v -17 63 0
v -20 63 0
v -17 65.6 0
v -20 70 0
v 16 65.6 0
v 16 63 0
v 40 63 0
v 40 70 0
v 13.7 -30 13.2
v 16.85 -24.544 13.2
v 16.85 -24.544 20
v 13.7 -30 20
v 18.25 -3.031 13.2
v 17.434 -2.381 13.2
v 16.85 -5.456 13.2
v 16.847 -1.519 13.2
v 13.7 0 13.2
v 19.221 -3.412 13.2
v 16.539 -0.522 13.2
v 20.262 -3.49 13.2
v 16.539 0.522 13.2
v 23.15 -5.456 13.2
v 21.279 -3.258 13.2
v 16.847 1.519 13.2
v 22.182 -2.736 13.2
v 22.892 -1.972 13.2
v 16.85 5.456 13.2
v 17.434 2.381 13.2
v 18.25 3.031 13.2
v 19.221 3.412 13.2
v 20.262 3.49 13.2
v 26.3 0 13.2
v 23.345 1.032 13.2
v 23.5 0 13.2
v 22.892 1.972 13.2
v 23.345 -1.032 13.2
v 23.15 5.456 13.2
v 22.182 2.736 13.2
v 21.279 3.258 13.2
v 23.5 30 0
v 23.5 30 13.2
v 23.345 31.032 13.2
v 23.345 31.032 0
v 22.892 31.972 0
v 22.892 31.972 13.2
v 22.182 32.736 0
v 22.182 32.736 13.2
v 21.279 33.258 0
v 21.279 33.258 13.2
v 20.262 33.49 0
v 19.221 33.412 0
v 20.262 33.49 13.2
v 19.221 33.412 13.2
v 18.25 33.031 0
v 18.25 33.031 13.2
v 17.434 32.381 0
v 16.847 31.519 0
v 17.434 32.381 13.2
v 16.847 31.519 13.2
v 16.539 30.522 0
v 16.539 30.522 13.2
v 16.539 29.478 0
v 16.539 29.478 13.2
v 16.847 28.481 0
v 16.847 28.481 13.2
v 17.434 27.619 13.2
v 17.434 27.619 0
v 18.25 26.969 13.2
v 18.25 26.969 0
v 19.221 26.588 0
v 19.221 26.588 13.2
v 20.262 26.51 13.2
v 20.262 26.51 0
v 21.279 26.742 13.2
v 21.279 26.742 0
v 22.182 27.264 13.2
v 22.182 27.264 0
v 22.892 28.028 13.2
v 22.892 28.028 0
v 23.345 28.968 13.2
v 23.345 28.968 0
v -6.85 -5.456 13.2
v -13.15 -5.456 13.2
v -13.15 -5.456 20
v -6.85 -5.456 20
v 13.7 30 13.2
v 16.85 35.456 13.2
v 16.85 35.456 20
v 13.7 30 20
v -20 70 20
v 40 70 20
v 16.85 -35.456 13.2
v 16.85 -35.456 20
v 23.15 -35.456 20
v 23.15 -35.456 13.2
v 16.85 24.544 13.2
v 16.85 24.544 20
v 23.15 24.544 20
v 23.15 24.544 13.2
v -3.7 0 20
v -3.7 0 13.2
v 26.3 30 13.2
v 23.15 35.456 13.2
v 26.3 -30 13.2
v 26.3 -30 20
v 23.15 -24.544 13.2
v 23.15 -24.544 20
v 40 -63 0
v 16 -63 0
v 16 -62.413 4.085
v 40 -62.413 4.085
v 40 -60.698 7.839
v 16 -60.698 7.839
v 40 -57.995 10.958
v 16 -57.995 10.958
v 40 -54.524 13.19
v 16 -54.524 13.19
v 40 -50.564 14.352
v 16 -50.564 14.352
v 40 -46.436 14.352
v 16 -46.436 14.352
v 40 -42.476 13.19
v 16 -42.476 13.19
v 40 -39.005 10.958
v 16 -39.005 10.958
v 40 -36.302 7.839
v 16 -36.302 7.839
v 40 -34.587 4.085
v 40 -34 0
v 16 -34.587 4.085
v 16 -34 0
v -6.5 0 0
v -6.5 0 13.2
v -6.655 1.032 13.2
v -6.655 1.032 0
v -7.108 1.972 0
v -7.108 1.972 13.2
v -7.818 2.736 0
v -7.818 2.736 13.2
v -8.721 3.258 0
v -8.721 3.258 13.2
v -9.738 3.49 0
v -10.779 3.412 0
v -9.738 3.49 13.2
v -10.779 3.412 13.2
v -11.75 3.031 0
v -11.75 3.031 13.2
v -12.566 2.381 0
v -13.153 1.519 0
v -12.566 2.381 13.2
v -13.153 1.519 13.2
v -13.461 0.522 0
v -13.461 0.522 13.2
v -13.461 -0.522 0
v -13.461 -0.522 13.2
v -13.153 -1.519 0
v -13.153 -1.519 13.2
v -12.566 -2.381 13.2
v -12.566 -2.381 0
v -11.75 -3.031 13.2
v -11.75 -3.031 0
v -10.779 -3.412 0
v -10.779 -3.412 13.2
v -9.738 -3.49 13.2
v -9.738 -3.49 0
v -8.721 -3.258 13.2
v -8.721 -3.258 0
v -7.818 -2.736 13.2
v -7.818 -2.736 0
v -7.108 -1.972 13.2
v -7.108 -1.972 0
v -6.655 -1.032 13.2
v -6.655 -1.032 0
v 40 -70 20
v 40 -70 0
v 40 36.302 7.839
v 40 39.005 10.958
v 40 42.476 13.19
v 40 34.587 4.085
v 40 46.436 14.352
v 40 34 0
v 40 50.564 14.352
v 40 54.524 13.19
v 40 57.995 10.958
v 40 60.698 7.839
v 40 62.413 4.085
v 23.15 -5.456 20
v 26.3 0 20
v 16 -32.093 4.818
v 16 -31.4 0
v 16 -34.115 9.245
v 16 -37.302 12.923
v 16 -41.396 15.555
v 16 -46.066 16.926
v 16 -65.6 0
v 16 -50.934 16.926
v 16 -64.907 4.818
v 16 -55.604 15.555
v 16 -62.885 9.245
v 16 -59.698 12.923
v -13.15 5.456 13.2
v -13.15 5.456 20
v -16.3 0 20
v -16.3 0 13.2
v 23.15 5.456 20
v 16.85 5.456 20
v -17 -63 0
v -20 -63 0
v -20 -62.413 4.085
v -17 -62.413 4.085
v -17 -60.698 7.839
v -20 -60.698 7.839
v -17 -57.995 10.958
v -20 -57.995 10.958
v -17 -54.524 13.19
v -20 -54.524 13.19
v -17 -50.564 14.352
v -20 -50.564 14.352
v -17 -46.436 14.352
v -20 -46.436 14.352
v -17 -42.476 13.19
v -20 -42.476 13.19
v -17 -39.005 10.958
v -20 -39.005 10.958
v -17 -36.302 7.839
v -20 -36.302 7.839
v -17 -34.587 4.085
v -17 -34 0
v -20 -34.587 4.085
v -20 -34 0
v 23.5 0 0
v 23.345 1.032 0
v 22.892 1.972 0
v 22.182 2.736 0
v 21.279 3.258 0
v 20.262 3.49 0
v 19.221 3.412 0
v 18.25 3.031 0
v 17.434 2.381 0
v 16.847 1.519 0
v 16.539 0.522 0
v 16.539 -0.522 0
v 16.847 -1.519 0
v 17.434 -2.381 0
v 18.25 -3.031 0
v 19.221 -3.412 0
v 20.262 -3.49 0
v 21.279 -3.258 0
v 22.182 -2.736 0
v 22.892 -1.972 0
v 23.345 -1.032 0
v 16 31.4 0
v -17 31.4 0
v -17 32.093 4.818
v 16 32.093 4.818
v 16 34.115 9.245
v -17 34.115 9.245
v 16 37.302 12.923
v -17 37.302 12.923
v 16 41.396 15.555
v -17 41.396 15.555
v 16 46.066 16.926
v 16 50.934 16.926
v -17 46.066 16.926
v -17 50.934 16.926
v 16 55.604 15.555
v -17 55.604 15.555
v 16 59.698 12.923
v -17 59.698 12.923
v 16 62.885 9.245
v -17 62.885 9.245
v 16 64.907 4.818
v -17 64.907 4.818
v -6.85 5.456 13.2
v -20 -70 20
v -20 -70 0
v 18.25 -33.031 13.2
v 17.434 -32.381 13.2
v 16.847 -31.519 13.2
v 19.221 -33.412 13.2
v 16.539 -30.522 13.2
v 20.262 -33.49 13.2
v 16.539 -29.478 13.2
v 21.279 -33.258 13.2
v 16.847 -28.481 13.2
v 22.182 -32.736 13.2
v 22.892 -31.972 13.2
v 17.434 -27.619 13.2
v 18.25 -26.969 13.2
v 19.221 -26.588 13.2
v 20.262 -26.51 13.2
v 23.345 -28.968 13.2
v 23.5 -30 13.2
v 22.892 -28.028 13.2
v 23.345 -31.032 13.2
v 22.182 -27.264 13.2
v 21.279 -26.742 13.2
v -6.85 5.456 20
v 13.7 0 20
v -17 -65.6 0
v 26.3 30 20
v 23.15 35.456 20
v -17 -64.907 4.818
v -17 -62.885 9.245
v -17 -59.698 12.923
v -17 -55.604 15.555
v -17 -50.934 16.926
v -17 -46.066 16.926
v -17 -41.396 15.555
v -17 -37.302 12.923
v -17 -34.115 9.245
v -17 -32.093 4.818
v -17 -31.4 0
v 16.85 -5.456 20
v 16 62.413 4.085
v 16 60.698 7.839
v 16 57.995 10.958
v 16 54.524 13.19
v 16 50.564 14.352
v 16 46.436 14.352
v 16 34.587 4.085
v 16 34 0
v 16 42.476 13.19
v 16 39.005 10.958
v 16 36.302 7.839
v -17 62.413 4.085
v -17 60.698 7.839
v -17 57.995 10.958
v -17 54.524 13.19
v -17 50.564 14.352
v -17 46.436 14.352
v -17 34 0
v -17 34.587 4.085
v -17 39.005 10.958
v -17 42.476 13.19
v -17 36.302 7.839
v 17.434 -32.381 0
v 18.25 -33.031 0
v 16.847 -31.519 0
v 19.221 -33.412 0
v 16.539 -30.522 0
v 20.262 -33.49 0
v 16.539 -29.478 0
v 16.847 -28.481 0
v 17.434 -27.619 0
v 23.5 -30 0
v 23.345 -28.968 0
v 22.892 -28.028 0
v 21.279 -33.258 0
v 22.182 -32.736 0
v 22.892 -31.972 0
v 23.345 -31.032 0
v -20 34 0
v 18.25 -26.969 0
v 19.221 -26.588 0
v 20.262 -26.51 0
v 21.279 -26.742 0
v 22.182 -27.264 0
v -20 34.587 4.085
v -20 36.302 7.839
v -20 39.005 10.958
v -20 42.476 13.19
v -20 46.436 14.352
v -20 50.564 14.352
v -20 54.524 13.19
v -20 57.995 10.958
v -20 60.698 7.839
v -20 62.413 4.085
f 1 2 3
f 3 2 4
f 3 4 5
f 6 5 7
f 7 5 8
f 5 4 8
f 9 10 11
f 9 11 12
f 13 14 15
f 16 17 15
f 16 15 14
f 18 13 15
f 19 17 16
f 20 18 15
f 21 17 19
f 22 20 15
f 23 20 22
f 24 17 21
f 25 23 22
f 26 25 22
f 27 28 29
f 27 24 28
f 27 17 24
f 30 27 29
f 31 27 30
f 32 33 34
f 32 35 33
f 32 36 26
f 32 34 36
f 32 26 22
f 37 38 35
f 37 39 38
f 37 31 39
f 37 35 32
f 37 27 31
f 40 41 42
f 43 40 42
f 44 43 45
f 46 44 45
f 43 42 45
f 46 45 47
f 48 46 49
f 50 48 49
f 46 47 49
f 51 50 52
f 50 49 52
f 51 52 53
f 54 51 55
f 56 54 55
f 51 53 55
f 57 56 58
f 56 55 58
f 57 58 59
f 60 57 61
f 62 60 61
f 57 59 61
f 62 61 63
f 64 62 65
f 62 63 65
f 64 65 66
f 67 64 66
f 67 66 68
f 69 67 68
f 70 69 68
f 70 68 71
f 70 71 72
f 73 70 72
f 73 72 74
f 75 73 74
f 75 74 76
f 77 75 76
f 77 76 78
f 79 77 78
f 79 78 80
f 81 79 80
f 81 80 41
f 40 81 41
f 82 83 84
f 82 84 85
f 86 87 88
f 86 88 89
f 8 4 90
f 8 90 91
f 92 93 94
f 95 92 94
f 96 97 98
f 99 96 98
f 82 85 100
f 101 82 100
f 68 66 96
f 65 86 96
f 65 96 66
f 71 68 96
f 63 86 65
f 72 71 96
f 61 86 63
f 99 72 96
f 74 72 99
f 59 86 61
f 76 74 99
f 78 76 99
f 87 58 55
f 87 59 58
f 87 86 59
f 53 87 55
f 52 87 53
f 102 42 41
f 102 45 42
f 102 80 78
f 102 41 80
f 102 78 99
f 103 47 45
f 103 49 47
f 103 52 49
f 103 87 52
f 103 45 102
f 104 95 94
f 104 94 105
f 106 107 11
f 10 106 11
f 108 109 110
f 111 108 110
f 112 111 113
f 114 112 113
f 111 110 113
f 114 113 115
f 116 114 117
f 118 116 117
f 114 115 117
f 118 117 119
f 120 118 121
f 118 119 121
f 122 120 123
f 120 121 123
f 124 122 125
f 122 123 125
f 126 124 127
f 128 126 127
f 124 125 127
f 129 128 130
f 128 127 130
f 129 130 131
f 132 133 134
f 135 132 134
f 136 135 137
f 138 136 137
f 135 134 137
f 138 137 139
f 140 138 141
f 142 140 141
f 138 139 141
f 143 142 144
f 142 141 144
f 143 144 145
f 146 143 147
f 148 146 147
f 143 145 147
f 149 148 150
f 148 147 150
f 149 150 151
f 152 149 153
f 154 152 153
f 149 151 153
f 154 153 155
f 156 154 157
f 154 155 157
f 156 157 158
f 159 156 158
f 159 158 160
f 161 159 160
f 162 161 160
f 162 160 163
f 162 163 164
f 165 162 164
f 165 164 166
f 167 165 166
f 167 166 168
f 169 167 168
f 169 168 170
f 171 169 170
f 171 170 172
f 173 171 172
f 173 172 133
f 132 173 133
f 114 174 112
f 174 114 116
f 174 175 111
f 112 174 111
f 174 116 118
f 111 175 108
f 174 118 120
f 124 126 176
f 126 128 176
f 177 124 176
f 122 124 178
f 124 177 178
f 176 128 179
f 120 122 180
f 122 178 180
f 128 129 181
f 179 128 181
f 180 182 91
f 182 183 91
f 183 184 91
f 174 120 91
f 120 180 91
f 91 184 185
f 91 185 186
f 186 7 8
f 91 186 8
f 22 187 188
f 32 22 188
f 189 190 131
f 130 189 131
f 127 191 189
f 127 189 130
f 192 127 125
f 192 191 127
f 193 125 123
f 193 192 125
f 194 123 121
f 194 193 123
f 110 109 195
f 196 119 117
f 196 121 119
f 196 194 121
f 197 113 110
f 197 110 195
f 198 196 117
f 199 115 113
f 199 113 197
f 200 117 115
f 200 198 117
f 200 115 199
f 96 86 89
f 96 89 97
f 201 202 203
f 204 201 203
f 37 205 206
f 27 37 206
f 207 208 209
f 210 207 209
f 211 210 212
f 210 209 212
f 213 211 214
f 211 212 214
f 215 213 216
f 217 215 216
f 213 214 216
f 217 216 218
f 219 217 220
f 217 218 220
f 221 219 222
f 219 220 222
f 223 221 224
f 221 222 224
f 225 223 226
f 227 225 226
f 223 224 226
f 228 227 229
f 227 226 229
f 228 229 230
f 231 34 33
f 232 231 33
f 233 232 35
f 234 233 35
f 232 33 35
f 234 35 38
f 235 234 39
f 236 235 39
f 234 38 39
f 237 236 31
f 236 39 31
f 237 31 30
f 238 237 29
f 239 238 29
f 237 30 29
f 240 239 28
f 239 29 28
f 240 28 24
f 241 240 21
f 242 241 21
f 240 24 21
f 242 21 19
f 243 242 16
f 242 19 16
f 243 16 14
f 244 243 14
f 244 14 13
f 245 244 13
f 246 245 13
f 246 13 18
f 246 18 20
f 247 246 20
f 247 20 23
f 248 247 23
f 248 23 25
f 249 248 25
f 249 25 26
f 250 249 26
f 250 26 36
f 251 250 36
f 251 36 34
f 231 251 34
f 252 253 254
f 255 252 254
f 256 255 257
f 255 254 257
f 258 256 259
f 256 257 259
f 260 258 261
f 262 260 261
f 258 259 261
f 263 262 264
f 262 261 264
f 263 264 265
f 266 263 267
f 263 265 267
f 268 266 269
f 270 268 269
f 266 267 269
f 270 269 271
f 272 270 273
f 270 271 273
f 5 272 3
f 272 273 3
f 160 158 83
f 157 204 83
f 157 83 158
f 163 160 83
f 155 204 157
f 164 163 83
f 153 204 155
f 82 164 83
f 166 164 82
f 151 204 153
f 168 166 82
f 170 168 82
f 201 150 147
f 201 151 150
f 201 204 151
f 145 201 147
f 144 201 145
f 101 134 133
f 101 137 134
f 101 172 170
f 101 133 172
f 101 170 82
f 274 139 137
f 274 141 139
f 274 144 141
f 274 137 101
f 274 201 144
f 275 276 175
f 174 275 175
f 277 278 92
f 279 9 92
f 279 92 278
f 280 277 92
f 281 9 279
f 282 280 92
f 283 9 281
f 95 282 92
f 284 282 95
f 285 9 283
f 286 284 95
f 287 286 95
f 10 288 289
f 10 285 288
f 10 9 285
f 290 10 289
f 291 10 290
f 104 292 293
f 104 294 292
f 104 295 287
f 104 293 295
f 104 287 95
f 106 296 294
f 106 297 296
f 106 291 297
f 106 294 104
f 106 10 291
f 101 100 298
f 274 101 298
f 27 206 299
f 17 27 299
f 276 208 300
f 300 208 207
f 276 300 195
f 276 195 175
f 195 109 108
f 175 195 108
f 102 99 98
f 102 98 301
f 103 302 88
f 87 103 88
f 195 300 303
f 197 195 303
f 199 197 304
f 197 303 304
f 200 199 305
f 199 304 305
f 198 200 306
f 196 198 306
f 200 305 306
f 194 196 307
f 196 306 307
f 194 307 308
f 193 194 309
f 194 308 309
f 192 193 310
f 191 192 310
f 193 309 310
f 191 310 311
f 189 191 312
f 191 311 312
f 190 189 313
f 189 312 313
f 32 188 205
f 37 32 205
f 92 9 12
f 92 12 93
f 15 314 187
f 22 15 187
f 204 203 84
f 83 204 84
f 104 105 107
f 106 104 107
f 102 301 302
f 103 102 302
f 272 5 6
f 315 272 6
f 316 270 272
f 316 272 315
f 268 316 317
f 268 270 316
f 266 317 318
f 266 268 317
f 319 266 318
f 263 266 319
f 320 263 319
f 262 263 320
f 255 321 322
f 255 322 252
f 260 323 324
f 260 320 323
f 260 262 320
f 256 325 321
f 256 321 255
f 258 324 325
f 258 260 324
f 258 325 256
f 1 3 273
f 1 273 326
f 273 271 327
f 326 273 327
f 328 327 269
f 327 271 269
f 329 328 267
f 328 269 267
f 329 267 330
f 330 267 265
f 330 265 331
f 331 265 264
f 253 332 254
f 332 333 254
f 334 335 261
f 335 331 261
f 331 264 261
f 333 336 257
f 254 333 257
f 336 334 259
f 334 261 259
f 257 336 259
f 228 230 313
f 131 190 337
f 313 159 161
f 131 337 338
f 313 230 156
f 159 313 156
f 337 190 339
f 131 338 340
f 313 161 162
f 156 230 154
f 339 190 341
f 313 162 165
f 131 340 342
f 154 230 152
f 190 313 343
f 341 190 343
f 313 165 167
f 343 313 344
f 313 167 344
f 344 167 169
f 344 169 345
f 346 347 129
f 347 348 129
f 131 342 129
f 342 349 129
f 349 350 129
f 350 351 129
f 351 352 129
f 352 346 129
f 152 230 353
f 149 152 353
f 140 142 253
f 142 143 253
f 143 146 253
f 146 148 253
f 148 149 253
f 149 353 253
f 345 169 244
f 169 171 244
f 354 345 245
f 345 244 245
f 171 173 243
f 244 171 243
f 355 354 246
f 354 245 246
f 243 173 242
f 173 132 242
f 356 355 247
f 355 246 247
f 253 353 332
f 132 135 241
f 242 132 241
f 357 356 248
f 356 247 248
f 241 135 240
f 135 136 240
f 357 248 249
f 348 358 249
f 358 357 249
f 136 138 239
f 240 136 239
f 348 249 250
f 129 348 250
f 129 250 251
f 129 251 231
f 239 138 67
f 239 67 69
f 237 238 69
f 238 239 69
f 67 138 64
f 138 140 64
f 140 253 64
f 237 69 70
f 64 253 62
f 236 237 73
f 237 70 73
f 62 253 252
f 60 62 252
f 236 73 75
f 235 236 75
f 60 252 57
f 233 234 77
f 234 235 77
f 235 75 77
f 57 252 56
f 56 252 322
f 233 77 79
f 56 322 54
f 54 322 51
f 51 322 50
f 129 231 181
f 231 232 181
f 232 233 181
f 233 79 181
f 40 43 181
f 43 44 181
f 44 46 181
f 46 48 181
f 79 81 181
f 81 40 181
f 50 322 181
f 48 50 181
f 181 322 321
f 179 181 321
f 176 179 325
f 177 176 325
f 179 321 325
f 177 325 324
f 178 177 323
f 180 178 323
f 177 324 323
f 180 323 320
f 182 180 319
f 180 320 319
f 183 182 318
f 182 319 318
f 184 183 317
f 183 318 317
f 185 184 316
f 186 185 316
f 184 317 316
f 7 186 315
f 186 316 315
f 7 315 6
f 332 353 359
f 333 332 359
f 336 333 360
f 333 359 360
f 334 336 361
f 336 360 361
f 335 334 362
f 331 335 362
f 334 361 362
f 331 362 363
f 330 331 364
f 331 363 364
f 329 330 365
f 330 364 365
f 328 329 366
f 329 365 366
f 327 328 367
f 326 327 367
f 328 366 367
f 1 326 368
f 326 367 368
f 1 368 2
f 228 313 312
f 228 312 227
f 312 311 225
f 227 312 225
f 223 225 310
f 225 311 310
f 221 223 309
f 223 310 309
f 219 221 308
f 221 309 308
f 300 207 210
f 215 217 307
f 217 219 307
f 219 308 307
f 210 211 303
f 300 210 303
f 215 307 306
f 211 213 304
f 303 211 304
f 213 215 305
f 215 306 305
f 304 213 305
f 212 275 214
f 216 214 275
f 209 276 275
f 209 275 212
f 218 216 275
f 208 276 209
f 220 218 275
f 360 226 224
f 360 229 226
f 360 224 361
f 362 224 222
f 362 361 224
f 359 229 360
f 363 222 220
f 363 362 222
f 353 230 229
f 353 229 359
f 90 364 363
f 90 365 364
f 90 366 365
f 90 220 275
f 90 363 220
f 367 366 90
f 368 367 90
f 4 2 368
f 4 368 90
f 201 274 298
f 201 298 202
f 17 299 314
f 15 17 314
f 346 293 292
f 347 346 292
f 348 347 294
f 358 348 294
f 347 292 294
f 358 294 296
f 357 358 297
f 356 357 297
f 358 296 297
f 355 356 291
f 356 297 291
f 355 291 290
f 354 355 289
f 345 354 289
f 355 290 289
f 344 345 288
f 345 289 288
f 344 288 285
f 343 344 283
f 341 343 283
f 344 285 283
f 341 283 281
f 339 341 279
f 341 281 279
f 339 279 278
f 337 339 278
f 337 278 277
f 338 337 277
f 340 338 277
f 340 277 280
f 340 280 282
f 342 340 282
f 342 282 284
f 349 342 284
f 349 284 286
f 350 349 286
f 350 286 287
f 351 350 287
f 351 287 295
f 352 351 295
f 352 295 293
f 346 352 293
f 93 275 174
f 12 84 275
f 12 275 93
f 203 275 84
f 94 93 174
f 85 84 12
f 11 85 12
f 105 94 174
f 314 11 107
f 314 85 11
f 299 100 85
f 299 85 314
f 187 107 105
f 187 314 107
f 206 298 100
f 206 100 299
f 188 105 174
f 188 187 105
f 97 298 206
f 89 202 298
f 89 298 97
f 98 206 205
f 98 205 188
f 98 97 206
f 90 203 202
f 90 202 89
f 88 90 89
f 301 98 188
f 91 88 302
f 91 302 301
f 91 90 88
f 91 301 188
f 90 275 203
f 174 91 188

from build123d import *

# Parameters (mm, degrees)
SKETCH_W        = 60
SKETCH_H        = 140
PAD_DEPTH       = 20
SKETCH001_R     = 14.5
POCKET_DEPTH    = 3
SKETCH002_R     = 17.1
POCKET001_DEPTH = 33
SKETCH003_R     = 14.5
POCKET002_DEPTH = 24.001
POCKET003_DEPTH = 6.8
SKETCH005_R     = 3.5
POCKET004_DEPTH = 13.201


with BuildPart() as part:
    # Sketch → Pad (new body)
    with BuildSketch(Plane.XY):
        with Locations((10, 0)):
            Rectangle(SKETCH_W, SKETCH_H)
    extrude(amount=PAD_DEPTH)

    # Sketch001 → Pocket (cut)
    with BuildSketch(Plane(origin=(-20, 0, 0), x_dir=(0, -1, 0), z_dir=(-1, 0, 0))):
        with Locations((-48.5, 0)):
            Circle(SKETCH001_R)
        with Locations((48.5, 0)):
            Circle(SKETCH001_R)
    extrude(amount=-POCKET_DEPTH, mode=Mode.SUBTRACT)

    # Sketch002 → Pocket001 (cut)
    with BuildSketch(Plane(origin=(-17, 0, 0), x_dir=(0, -1, 0), z_dir=(-1, 0, 0))):
        with Locations((-48.5, 0)):
            Circle(SKETCH002_R)
        with Locations((48.5, 0)):
            Circle(SKETCH002_R)
    extrude(amount=-POCKET001_DEPTH, mode=Mode.SUBTRACT)

    # Sketch003 → Pocket002 (cut, through all)
    with BuildSketch(Plane(origin=(16, 0, 0), x_dir=(0, -1, 0), z_dir=(-1, 0, 0))):
        with Locations((-48.5, 0)):
            Circle(SKETCH003_R)
        with Locations((48.5, 0)):
            Circle(SKETCH003_R)
    extrude(amount=-POCKET002_DEPTH, mode=Mode.SUBTRACT)

    # Sketch004 → Pocket003 (cut)
    with BuildSketch(Plane.XY.offset(20)):
        Polygon((-36.85, -5.45596), (-33.7, 0), (-36.85, 5.45596), (-43.15, 5.45596), (-46.3, 0), (-43.15, -5.45596), align=None)
        Polygon((23.15, 5.45596), (16.85, 5.45596), (13.7, 0), (16.85, -5.45596), (23.15, -5.45596), (26.3, 0), align=None)
        Polygon((-3.7, 0), (-6.85, 5.45596), (-13.15, 5.45596), (-16.3, 0), (-13.15, -5.45596), (-6.85, -5.45596), align=None)
        Polygon((-33.7, 30), (-36.85, 35.45596), (-43.15, 35.45596), (-46.3, 30), (-43.15, 24.54404), (-36.85, 24.54404), align=None)
        Polygon((13.7, 30), (16.85, 24.54404), (23.15, 24.54404), (26.3, 30), (23.15, 35.45596), (16.85, 35.45596), align=None)
        Polygon((-33.7, -30), (-36.85, -24.54404), (-43.15, -24.54404), (-46.3, -30), (-43.15, -35.45596), (-36.85, -35.45596), align=None)
        Polygon((13.7, -30), (16.85, -35.45596), (23.15, -35.45596), (26.3, -30), (23.15, -24.54404), (16.85, -24.54404), align=None)
    extrude(amount=-POCKET003_DEPTH, mode=Mode.SUBTRACT)

    # Sketch005 → Pocket004 (cut, through all)
    with BuildSketch(Plane.XY.offset(13.2)):
        with Locations((-40, 30)):
            Circle(SKETCH005_R)
        with Locations((20, 30)):
            Circle(SKETCH005_R)
        with Locations((20, -30)):
            Circle(SKETCH005_R)
        with Locations((-40, -30)):
            Circle(SKETCH005_R)
        with Locations((-40, 0)):
            Circle(SKETCH005_R)
        with Locations((20, 0)):
            Circle(SKETCH005_R)
        with Locations((-10, 0)):
            Circle(SKETCH005_R)
    extrude(amount=-POCKET004_DEPTH, mode=Mode.SUBTRACT)


solid = part.part
